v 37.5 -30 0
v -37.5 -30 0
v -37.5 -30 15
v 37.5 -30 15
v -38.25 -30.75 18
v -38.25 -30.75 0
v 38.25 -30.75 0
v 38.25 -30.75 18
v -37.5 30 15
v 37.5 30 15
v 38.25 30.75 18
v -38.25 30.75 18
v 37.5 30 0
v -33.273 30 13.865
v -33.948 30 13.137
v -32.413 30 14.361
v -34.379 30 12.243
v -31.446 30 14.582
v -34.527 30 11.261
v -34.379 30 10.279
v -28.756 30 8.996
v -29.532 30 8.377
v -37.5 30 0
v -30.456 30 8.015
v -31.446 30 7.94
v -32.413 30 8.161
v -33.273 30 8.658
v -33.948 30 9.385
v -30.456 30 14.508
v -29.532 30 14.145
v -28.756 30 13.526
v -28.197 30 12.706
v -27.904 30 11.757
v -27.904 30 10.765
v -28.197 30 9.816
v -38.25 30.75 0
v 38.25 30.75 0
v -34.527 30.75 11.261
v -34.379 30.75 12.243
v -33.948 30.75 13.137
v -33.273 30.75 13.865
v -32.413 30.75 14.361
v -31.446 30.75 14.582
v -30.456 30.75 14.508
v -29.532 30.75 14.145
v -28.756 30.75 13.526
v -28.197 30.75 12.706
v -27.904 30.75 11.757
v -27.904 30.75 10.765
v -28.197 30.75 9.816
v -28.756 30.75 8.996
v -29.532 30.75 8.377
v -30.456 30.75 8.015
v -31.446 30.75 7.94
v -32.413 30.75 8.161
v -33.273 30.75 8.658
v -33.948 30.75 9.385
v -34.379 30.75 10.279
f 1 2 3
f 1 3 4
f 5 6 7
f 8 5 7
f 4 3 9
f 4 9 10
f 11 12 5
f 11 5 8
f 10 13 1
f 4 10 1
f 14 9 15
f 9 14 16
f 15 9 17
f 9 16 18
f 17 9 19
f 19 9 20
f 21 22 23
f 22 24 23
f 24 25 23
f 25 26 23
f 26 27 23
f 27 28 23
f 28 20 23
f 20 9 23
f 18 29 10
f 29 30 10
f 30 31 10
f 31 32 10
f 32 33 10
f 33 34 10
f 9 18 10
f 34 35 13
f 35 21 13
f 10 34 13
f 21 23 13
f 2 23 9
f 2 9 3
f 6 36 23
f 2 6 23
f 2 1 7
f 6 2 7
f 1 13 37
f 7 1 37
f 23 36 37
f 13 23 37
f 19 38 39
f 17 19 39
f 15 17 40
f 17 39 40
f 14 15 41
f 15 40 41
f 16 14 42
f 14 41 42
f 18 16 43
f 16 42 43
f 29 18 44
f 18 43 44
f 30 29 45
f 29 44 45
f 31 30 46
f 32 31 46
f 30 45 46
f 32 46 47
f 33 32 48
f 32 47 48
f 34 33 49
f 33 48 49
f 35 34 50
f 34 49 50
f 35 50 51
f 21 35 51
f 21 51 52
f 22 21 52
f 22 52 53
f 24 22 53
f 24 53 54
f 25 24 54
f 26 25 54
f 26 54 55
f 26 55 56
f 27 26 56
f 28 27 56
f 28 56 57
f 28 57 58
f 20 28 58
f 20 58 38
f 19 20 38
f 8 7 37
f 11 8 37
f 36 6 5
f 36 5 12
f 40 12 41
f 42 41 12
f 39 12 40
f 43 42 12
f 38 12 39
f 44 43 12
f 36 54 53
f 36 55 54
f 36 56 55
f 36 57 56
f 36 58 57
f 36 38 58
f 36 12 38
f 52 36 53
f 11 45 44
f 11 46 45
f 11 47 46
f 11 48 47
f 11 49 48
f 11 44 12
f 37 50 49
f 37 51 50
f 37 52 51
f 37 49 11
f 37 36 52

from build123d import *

# Parameters (mm, degrees)
SKETCH_W        = 76.5
SKETCH_H        = 61.5
PAD_DEPTH       = 18
SKETCH001_W     = 75
SKETCH001_H     = 60
POCKET_DEPTH    = 15
SKETCH003_R     = 3.33
POCKET001_DEPTH = 5


with BuildPart() as part:
    # Sketch → Pad (new body)
    with BuildSketch(Plane.XY):
        Rectangle(SKETCH_W, SKETCH_H)
    extrude(amount=PAD_DEPTH)

    # Sketch001 (on Face5 of Pad) → Pocket (cut)
    with BuildSketch(Plane(origin=(0, 0, 0), x_dir=(1, 0, 0), z_dir=(0, 0, -1))):
        Rectangle(SKETCH001_W, SKETCH001_H)
    extrude(amount=-POCKET_DEPTH, mode=Mode.SUBTRACT)

    # Sketch003 (on Face1 of Pocket) → Pocket001 (cut)
    with BuildSketch(Plane(origin=(0, 30.75, 0), x_dir=(-1, 0, 0), z_dir=(0, 1, 0))):
        with Locations((31.1968, 11.26101)):
            Circle(SKETCH003_R)
    extrude(amount=-POCKET001_DEPTH, mode=Mode.SUBTRACT)


solid = part.part
